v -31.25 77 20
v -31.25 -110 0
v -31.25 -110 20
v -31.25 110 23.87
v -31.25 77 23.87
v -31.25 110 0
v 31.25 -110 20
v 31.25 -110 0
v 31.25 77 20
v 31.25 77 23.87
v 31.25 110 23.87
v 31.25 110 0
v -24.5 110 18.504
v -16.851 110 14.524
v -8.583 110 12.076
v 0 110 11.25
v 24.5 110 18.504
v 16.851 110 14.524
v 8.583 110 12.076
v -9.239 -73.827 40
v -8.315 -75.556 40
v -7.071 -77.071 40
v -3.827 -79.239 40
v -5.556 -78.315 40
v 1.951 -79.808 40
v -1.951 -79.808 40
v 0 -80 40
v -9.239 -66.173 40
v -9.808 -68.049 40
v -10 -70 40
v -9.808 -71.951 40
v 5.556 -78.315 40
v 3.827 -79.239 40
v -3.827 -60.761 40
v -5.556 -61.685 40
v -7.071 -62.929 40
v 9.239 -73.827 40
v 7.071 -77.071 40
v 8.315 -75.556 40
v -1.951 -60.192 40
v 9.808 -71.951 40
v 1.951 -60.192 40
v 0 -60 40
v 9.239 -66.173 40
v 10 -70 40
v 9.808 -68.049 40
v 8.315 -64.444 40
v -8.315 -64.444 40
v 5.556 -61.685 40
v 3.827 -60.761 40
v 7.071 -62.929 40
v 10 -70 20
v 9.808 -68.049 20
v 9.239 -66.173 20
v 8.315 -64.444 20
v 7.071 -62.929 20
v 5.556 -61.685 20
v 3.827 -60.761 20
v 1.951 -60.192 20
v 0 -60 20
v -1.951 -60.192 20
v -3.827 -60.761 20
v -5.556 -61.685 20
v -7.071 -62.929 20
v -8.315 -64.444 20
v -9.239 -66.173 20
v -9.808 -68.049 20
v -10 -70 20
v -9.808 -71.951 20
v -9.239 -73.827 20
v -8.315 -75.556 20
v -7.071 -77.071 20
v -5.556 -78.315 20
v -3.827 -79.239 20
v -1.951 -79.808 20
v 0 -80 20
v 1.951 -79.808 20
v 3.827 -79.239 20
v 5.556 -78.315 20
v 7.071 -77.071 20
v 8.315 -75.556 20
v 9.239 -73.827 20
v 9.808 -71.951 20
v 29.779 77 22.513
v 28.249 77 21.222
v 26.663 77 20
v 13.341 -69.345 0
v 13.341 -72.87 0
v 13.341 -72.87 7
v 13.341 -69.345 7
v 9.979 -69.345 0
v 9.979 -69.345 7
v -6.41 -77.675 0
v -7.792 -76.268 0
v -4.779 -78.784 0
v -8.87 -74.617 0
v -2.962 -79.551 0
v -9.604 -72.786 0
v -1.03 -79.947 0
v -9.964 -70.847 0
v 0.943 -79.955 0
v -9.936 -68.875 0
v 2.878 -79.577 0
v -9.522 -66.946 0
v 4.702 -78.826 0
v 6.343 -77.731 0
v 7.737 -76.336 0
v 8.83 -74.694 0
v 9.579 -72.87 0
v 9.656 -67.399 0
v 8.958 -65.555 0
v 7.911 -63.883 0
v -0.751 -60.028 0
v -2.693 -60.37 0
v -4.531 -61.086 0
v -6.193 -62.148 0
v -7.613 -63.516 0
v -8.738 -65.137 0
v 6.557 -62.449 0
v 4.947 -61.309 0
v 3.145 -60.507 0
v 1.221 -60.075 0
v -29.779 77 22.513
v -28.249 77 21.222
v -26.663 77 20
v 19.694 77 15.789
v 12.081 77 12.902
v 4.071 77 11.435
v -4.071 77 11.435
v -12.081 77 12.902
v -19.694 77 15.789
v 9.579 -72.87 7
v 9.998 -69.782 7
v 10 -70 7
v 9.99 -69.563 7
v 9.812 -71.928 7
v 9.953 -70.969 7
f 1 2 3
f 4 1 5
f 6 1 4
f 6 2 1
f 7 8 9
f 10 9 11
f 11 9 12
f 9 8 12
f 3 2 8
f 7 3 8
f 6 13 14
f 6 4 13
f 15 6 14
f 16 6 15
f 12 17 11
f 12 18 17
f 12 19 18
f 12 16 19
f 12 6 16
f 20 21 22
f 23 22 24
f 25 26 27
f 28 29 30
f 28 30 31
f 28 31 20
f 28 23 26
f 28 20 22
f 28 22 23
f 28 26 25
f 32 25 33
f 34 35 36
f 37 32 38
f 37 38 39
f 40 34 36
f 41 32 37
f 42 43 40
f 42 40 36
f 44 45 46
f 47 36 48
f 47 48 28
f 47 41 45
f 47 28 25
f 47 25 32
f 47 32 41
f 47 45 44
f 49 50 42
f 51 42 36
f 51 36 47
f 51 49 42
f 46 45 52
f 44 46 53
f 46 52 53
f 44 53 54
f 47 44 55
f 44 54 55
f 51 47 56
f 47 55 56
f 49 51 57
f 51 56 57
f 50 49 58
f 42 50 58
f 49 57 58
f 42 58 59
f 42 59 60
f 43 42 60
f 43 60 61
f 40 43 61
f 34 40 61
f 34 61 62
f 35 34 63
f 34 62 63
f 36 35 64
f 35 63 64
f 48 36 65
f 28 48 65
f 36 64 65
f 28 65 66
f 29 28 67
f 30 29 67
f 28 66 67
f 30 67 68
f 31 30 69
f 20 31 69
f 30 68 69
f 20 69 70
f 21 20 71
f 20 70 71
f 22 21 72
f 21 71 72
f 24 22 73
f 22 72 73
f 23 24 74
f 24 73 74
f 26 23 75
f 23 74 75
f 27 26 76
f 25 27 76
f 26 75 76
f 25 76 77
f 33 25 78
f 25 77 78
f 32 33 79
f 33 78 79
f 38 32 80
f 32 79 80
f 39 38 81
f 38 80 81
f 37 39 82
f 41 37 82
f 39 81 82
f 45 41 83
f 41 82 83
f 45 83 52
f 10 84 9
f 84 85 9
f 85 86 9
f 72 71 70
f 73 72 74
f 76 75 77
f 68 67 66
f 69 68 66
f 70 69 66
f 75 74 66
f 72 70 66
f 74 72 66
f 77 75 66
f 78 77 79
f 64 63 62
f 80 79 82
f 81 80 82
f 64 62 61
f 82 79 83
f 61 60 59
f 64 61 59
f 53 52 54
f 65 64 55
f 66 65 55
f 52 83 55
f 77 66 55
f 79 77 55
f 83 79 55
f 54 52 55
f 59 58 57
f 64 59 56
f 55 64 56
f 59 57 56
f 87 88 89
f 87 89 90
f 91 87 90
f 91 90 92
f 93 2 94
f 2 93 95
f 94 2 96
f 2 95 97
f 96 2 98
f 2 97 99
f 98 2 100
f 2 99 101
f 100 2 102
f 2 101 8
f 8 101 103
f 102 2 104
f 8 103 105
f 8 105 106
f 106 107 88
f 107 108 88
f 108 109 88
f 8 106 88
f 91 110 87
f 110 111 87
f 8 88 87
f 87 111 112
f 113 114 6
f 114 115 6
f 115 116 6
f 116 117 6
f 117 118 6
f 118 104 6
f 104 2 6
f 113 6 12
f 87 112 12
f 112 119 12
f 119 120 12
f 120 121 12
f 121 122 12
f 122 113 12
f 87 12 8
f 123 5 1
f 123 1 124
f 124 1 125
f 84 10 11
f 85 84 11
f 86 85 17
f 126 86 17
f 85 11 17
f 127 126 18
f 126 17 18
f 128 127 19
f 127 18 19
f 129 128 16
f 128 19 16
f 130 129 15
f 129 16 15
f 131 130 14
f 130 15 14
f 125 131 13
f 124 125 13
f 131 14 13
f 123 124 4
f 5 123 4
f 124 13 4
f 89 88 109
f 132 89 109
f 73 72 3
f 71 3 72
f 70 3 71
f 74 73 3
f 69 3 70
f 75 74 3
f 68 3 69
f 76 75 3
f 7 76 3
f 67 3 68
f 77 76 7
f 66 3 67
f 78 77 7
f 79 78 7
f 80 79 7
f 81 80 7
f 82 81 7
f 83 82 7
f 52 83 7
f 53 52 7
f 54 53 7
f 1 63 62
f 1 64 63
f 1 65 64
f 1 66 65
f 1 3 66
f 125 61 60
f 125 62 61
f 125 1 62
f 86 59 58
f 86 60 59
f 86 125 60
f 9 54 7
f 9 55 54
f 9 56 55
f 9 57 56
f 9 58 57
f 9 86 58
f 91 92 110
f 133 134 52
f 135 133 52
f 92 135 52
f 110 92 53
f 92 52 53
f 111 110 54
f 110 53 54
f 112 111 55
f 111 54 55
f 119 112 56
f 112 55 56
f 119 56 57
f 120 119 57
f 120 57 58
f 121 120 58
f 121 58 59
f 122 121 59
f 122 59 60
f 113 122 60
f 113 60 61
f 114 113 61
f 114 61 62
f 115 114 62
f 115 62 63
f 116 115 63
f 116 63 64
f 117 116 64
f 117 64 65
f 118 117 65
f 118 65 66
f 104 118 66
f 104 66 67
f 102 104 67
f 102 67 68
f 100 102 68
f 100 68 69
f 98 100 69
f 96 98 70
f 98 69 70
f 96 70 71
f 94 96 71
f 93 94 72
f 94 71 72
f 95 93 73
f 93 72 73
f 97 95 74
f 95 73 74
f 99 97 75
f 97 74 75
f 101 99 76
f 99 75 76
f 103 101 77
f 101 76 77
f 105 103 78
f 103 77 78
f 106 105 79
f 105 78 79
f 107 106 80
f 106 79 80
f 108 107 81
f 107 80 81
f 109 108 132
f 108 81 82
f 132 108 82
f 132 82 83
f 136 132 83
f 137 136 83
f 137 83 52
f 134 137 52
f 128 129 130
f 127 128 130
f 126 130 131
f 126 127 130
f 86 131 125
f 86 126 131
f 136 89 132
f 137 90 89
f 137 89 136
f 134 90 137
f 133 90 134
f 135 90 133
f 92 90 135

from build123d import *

# Parameters (mm, degrees)
SKETCH1_W           = 62.5
SKETCH1_H           = 220
BOSS_EXTRUDE1_DEPTH = 20
SKETCH2_W           = 62.5
SKETCH2_H           = 33
BOSS_EXTRUDE2_DEPTH = 5
SKETCH3_R           = 10
CUT_EXTRUDE1_DEPTH  = 21
CUT_EXTRUDE2_DEPTH  = 33
SKETCH5_R           = 10
BOSS_EXTRUDE3_DEPTH = 20
SKETCH6_W           = 3.761588262
SKETCH6_H           = 3.524392854
CUT_EXTRUDE3_DEPTH  = 7


with BuildPart() as part:
    # Sketch1 → Boss-Extrude1 (new body)
    with BuildSketch(Plane.XY):
        Rectangle(SKETCH1_W, SKETCH1_H)
    extrude(amount=BOSS_EXTRUDE1_DEPTH)

    # Sketch2 → Boss-Extrude2 (add)
    with BuildSketch(Plane.XY.offset(20)):
        with Locations((0, 93.5)):
            Rectangle(SKETCH2_W, SKETCH2_H)
    extrude(amount=BOSS_EXTRUDE2_DEPTH)

    # Sketch3 → Cut-Extrude1 (cut, through all)
    with BuildSketch(Plane.XY.offset(20)):
        with Locations((0, -70)):
            Circle(SKETCH3_R)
    extrude(amount=-CUT_EXTRUDE1_DEPTH, mode=Mode.SUBTRACT)

    # Sketch4 → Cut-Extrude2 (cut)
    with BuildSketch(Plane(origin=(0, 110, 0), x_dir=(1, 0, 0), z_dir=(0, 1, 0))):
        with BuildLine():
            Line((30.073382628, -25), (31.25, -25))
            Line((31.25, -25), (31.25, -23.870415383))
            ThreePointArc((31.25, -23.870415383), (0, -11.25), (-31.25, -23.870415383))
            Line((-31.25, -23.870415383), (-31.25, -25))
            Line((-31.25, -25), (30.073382628, -25))
        make_face()
    extrude(amount=-CUT_EXTRUDE2_DEPTH, mode=Mode.SUBTRACT)

    # Sketch6 → Cut-Extrude3 (cut)
    with BuildSketch(Plane(origin=(0, 0, 0), x_dir=(-1, 0, 0), z_dir=(0, 0, -1))):
        with Locations((-11.460210717, -71.107433841)):
            Rectangle(SKETCH6_W, SKETCH6_H)
    extrude(amount=-CUT_EXTRUDE3_DEPTH, mode=Mode.SUBTRACT)


with BuildPart() as body_2:
    # Sketch5 → Boss-Extrude3 (new body)
    with BuildSketch(Plane.XY.offset(20)):
        with Locations((0, -70)):
            Circle(SKETCH5_R)
    extrude(amount=BOSS_EXTRUDE3_DEPTH)


solid = Compound([part.part, body_2.part])
